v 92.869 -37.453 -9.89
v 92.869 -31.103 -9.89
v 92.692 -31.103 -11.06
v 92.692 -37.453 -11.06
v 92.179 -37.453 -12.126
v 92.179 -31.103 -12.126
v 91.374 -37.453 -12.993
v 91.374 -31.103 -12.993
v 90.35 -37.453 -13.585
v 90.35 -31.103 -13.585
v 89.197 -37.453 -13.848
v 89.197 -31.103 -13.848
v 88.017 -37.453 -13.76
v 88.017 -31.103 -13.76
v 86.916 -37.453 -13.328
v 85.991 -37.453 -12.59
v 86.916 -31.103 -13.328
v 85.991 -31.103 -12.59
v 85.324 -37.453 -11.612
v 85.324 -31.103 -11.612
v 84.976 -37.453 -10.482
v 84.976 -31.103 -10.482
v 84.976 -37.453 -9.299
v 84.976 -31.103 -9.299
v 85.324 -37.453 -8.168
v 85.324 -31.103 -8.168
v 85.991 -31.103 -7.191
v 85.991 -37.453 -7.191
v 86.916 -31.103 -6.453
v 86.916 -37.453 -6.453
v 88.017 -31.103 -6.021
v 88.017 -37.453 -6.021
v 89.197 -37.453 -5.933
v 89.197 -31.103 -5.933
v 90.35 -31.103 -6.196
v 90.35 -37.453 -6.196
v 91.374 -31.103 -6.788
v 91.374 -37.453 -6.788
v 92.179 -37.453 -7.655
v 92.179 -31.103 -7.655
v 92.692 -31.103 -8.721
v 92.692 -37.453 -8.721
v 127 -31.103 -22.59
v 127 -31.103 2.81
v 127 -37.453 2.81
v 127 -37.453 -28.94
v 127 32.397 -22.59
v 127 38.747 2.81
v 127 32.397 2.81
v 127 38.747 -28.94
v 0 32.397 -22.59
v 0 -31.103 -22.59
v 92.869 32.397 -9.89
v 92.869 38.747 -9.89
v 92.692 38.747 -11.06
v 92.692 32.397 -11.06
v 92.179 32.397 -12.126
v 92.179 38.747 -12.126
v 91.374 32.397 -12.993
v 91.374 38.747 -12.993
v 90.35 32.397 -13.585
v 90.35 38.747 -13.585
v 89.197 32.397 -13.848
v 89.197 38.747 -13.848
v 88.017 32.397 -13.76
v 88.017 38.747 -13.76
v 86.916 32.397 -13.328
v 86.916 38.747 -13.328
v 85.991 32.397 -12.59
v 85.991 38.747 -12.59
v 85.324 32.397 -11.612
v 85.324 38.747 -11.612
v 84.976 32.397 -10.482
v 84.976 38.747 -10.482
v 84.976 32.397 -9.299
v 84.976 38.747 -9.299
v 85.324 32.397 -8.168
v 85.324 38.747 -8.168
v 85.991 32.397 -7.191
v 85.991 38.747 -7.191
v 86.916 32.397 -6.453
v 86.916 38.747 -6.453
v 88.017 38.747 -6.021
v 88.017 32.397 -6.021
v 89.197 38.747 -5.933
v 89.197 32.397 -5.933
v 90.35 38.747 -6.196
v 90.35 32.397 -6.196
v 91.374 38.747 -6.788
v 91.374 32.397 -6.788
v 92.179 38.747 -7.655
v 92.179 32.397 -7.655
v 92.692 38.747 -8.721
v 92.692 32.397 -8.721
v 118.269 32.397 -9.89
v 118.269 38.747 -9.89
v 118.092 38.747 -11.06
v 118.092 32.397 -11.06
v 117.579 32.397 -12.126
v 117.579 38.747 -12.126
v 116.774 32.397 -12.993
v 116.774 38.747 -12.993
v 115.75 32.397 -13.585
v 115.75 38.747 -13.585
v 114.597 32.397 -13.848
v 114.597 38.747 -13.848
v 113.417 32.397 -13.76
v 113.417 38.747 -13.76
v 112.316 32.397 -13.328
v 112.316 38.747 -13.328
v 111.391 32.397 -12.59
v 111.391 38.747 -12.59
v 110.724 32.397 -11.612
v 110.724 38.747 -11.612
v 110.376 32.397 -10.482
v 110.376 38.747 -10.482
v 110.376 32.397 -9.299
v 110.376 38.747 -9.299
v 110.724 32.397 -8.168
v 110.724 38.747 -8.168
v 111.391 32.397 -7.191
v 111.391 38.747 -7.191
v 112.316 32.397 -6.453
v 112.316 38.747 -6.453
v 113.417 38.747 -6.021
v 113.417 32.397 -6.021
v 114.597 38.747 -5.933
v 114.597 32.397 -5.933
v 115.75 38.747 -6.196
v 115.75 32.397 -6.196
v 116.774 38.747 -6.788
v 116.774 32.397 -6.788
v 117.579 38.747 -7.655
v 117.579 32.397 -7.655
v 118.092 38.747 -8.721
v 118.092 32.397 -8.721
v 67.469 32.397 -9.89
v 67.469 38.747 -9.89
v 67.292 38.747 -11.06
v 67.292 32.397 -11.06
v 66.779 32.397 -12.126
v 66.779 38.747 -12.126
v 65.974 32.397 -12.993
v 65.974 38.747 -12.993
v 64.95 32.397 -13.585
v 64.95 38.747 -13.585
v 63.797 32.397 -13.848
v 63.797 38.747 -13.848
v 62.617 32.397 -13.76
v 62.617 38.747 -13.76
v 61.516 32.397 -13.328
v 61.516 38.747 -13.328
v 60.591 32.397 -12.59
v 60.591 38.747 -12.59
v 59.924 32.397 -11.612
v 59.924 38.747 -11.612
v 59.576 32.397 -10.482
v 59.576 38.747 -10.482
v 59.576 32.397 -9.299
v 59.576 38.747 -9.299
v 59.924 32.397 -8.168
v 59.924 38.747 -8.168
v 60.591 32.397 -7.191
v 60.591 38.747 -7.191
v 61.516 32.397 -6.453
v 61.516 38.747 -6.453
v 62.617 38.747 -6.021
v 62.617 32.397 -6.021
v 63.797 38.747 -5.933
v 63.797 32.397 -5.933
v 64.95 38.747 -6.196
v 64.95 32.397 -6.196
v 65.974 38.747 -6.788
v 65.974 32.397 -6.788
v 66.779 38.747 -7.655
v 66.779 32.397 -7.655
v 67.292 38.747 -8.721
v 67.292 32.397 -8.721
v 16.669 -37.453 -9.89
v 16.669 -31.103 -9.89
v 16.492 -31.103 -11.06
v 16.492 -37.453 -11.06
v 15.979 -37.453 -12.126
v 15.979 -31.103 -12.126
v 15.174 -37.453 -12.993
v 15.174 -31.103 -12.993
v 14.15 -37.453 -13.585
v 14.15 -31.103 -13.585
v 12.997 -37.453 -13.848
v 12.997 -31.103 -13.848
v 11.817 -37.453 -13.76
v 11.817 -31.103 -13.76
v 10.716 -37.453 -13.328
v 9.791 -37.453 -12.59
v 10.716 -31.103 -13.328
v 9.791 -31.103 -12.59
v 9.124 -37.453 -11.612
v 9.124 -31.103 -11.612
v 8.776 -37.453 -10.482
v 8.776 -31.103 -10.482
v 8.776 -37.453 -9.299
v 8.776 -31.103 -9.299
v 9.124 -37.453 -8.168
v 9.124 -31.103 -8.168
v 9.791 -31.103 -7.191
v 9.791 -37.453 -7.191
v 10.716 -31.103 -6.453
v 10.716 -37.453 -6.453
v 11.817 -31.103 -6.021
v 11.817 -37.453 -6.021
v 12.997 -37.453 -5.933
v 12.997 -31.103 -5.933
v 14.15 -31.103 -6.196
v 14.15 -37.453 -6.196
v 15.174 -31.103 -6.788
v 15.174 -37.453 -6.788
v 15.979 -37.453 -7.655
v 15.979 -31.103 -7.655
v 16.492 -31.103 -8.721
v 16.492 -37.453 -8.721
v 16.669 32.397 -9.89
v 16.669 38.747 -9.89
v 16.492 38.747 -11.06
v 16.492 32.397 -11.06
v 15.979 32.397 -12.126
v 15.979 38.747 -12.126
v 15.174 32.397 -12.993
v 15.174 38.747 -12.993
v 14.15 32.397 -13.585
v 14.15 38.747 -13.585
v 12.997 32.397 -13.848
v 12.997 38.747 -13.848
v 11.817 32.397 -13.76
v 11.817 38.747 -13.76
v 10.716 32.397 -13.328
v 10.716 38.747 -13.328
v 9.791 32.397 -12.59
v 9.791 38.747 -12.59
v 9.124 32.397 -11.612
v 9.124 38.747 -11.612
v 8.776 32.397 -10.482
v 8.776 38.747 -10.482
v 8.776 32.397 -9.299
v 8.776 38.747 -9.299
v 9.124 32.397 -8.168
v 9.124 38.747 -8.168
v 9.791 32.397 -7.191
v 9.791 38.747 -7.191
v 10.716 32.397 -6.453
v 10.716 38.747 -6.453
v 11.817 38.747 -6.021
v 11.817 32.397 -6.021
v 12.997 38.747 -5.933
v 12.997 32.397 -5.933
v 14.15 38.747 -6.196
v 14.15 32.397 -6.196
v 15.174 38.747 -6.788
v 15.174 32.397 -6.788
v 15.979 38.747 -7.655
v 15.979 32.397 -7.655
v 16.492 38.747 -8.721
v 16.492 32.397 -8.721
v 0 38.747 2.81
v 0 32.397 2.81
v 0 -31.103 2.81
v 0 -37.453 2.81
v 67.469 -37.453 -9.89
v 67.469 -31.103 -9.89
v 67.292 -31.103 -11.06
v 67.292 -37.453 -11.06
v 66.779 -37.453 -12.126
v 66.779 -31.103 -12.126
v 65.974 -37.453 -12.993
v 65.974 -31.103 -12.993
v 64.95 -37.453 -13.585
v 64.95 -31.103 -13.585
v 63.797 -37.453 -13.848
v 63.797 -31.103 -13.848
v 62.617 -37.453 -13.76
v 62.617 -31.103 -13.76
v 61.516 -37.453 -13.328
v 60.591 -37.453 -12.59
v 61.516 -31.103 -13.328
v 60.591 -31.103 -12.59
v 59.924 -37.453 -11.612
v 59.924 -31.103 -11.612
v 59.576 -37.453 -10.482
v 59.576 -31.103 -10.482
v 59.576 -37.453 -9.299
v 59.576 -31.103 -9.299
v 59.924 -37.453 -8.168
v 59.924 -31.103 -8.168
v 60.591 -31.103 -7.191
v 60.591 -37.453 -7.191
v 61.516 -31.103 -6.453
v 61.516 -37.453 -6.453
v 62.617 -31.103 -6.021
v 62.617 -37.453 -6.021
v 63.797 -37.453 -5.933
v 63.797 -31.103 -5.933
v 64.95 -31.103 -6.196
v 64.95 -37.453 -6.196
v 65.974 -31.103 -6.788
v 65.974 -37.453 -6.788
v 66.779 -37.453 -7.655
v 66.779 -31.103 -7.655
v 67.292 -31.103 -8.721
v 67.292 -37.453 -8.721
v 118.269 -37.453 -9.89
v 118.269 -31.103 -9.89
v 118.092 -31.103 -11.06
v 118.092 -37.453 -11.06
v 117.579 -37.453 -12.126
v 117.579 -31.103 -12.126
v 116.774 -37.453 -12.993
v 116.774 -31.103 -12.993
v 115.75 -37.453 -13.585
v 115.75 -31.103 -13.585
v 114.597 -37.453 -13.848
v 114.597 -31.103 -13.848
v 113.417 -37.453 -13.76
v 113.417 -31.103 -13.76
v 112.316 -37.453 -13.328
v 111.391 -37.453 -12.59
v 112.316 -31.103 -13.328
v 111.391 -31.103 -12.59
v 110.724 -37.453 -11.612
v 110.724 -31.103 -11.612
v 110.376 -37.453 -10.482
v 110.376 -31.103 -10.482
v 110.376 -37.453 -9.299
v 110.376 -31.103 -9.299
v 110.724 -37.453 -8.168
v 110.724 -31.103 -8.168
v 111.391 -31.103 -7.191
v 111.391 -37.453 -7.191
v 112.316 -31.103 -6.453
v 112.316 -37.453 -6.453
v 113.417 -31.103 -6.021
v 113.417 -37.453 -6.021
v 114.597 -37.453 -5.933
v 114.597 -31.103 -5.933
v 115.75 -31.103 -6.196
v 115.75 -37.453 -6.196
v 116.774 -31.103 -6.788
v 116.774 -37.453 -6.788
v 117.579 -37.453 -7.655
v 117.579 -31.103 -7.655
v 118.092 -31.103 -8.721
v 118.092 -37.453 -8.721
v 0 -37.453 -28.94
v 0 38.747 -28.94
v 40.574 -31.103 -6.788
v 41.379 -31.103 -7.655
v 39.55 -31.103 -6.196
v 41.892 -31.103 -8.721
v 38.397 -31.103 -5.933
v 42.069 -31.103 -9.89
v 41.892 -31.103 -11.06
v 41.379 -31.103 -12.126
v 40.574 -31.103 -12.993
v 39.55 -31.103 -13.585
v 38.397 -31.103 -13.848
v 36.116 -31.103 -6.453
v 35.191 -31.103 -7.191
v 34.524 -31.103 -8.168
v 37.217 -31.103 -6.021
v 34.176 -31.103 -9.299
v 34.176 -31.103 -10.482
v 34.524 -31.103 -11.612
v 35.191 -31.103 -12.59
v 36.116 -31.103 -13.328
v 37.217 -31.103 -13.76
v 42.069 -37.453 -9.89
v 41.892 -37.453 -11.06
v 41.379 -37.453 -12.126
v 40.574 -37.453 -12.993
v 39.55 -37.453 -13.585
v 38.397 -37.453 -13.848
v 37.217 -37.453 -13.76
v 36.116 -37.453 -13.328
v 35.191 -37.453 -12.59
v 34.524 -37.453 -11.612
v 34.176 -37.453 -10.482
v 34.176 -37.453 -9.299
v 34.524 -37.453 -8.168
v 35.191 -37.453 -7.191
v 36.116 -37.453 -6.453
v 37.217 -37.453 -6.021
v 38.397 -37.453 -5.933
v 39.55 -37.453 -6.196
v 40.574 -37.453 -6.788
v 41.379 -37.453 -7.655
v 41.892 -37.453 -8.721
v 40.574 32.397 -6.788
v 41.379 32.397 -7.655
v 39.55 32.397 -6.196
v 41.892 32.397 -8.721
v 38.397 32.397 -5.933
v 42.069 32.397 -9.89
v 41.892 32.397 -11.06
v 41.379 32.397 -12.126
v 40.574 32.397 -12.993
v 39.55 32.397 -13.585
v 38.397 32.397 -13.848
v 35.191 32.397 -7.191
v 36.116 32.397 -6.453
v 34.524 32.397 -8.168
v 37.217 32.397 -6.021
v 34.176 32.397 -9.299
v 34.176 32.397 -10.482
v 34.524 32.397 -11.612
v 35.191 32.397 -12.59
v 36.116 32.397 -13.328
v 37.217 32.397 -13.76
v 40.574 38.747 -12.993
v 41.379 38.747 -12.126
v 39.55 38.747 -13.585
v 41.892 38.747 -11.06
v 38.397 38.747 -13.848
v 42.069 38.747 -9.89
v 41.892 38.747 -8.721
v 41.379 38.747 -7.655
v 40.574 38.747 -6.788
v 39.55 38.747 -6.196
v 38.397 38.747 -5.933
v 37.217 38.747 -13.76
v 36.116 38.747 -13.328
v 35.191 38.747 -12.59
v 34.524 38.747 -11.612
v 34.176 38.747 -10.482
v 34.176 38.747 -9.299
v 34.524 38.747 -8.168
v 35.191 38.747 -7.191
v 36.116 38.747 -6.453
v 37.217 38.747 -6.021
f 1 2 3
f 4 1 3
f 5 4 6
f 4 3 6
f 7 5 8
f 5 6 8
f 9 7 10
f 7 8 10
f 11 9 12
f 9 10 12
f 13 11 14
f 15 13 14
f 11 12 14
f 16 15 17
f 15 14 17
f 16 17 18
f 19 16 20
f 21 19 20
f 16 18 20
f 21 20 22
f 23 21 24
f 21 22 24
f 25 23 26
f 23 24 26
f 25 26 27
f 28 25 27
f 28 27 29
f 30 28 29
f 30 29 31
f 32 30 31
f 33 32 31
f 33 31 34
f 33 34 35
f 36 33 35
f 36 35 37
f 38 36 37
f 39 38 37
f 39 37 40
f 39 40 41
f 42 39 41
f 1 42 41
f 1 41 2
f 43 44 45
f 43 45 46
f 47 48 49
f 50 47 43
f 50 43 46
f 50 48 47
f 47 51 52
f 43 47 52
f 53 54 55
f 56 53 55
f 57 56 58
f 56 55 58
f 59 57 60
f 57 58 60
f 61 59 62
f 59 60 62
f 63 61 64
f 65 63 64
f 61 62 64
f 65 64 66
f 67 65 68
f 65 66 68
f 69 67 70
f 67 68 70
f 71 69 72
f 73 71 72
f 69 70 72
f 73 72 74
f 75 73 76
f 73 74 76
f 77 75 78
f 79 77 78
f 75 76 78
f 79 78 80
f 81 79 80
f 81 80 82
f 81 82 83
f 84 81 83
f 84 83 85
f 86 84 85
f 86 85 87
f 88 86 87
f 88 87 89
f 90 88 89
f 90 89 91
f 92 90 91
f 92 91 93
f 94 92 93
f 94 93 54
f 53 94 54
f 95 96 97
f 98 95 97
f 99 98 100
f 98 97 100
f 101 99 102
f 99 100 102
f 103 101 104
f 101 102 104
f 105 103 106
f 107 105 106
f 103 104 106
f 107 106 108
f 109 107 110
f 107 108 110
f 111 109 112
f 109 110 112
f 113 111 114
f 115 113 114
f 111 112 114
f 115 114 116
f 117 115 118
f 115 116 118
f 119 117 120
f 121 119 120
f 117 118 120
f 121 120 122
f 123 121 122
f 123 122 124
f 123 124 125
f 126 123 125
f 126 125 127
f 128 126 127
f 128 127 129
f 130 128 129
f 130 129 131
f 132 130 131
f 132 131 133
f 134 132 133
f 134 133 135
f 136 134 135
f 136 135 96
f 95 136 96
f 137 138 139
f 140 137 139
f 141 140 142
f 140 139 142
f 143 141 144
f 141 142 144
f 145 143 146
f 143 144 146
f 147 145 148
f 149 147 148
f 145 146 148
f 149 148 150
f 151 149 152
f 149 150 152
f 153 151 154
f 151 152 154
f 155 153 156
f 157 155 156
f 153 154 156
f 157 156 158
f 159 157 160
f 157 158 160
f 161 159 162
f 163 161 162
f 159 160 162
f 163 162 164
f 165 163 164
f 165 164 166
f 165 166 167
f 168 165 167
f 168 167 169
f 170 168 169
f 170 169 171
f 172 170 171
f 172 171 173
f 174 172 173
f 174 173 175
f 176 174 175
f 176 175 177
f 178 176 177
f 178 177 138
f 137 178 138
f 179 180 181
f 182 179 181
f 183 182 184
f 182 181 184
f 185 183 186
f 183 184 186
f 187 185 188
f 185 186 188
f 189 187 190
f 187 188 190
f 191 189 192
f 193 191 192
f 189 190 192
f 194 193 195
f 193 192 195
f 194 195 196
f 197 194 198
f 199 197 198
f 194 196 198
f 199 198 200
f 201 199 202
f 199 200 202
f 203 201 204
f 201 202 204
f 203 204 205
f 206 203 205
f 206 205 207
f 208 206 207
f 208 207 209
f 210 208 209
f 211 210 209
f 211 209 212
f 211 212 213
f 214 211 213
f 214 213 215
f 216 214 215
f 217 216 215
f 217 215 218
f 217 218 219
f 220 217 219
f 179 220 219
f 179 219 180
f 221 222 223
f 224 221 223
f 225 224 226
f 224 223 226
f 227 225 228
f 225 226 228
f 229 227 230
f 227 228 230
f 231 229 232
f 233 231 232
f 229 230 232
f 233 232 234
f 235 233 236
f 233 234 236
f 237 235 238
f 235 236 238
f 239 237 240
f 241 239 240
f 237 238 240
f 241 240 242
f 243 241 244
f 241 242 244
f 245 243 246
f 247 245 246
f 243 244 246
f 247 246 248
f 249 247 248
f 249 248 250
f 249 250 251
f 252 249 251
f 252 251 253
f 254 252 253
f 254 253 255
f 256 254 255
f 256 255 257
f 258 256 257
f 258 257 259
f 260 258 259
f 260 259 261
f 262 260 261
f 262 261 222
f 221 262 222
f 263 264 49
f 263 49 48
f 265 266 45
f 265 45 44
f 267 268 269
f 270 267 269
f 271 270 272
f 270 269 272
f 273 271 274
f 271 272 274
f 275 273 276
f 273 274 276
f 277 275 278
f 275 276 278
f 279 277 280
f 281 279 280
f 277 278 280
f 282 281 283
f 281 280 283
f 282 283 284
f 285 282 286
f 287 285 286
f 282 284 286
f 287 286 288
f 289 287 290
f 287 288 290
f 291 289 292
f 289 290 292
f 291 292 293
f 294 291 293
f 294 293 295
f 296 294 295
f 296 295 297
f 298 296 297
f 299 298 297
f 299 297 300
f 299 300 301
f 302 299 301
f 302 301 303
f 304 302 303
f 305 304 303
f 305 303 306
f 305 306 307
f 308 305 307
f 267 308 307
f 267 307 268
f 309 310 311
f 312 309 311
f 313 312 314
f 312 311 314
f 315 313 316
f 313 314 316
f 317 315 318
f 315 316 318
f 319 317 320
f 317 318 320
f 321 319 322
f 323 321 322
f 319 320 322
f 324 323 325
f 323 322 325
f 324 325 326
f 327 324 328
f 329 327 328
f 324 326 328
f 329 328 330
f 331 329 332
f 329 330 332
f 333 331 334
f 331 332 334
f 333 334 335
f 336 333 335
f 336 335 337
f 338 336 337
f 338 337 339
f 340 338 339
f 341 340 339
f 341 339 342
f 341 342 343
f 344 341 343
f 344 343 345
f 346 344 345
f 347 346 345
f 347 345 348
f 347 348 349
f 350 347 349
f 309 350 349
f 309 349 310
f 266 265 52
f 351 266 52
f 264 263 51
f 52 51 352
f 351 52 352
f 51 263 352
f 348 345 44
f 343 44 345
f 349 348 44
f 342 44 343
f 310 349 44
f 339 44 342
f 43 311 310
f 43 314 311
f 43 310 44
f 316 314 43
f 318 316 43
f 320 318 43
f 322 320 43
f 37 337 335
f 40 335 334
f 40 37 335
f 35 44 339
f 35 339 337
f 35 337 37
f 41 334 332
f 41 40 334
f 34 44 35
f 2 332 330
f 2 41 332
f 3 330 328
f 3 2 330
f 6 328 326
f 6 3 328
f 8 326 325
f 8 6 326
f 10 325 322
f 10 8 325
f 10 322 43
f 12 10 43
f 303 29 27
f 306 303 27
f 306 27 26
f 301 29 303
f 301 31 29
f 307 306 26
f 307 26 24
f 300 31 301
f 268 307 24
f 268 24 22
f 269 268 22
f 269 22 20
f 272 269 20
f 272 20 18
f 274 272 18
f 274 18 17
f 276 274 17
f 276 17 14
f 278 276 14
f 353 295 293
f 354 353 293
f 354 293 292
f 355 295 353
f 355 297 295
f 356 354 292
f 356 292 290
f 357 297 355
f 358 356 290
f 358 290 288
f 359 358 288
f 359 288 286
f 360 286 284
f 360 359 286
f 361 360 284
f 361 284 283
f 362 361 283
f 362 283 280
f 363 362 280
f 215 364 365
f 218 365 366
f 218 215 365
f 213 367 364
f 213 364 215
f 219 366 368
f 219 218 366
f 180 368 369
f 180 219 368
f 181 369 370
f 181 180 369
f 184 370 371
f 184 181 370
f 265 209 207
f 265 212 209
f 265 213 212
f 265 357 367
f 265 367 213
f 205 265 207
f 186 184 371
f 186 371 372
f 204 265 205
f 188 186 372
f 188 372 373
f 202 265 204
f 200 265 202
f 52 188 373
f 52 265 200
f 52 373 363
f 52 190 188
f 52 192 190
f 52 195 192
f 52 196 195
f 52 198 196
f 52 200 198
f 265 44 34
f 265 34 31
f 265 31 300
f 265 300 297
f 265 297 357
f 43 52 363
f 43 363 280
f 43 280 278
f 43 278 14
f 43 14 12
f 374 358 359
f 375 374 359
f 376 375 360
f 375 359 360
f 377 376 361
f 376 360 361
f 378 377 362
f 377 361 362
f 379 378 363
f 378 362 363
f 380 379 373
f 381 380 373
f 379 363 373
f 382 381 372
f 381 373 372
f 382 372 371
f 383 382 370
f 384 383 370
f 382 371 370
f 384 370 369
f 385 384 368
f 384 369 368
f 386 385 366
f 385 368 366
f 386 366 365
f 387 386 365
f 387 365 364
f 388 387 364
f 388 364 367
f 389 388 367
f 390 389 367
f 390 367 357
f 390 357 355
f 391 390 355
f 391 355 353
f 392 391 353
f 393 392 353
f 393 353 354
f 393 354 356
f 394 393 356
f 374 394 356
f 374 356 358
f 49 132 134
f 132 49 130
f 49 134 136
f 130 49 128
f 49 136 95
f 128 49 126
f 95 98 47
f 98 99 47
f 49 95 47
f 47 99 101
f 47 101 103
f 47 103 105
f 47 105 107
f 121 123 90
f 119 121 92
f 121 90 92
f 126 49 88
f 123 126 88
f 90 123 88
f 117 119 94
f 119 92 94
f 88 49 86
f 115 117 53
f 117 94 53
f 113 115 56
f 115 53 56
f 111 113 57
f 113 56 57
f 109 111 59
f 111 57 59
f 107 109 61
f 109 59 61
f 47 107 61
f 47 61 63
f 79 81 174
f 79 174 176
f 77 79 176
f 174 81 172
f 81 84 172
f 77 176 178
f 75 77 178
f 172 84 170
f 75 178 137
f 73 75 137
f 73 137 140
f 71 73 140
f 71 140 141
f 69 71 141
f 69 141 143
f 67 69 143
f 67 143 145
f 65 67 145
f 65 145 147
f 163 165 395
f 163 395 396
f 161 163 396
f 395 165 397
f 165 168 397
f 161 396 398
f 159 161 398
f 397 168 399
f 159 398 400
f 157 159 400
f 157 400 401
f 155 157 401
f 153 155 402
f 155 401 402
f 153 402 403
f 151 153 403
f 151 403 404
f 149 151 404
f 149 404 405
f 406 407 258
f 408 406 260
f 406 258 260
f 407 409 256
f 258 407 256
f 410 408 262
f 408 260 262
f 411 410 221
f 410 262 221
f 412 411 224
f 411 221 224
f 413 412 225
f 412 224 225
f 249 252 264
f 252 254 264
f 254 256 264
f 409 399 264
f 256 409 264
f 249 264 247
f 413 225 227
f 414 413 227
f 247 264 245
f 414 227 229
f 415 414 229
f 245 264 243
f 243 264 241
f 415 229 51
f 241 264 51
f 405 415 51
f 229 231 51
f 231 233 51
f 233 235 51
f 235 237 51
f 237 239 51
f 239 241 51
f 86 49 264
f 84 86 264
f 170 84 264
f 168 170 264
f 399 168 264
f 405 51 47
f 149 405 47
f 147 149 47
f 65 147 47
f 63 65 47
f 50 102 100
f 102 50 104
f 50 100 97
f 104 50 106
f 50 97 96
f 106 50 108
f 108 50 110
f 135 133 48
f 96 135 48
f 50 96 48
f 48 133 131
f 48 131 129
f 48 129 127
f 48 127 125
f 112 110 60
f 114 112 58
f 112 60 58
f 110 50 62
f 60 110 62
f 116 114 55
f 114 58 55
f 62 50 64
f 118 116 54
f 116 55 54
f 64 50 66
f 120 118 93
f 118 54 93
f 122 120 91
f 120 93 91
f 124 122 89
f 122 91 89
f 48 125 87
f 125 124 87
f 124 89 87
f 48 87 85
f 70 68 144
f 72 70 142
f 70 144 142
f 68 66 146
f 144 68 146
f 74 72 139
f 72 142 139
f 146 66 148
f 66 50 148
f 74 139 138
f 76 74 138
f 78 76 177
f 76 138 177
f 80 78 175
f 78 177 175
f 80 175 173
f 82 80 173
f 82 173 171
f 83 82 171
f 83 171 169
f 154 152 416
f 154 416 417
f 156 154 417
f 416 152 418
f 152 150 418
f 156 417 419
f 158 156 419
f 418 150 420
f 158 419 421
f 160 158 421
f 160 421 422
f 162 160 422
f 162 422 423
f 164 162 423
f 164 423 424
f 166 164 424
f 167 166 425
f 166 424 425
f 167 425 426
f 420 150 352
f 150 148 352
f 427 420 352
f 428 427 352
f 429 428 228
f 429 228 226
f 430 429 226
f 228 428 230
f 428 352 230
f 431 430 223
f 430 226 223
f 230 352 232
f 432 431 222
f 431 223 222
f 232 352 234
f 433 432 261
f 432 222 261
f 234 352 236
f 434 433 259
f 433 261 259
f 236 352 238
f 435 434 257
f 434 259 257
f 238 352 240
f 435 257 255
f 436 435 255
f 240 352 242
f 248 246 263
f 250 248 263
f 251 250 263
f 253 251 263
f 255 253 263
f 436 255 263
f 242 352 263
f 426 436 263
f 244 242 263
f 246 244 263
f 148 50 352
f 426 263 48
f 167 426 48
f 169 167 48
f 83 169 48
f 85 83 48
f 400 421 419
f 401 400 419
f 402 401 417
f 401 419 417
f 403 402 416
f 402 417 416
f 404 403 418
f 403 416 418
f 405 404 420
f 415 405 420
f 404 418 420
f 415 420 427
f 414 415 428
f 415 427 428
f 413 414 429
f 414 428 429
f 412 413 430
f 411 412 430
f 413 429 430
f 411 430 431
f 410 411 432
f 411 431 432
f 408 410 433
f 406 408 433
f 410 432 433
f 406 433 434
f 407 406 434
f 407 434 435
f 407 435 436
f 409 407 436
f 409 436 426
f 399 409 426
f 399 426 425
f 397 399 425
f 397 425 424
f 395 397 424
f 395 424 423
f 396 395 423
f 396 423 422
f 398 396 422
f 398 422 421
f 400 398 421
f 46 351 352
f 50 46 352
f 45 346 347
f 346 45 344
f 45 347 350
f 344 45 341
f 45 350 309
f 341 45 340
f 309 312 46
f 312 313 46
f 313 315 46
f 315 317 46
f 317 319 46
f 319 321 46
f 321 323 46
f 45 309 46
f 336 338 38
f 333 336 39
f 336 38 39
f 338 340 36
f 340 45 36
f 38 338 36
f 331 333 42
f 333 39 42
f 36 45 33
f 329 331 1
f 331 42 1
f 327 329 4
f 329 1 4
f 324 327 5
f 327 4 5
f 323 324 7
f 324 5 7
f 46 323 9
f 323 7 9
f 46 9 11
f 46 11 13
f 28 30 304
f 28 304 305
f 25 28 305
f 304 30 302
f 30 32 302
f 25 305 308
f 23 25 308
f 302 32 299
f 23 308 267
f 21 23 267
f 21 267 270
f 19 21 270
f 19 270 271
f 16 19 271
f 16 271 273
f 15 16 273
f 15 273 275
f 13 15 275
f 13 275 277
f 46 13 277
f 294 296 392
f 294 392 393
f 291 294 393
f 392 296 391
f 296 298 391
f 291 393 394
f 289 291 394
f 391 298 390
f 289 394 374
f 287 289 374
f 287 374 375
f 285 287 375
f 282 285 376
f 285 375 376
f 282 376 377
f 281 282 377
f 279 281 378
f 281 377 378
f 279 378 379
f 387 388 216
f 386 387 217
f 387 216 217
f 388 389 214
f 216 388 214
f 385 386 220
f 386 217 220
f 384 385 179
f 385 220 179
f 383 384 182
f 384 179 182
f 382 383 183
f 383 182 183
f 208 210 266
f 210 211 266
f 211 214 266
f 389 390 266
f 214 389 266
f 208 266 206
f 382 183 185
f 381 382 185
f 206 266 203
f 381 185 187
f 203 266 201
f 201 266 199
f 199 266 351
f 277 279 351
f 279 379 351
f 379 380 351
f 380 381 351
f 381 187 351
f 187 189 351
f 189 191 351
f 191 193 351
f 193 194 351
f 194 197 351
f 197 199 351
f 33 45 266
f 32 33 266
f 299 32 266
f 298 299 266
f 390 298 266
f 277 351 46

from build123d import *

# Parameters (mm, degrees)
SKETCH1_W           = 25.4
SKETCH1_H           = 6.35
BOSS_EXTRUDE1_DEPTH = 127
SKETCH2_R           = 3.96875
CUT_EXTRUDE1_DEPTH  = 77.2


with BuildPart() as part:
    # Sketch1 → Boss-Extrude1 (new body)
    with BuildSketch(Plane(origin=(0, 0, 0), x_dir=(0, 0, -1), z_dir=(1, 0, 0))):
        with Locations((9.890468116, 35.572429457)):
            Rectangle(SKETCH1_W, SKETCH1_H)
        Polygon((28.940468116, 38.747429457), (22.590468116, 38.747429457), (22.590468116, 32.397429457), (22.590468116, -31.102570543), (22.590468116, -37.452570543), (28.940468116, -37.452570543), align=None)
        with Locations((9.890468116, -34.277570543)):
            Rectangle(SKETCH1_W, SKETCH1_H)
    extrude(amount=BOSS_EXTRUDE1_DEPTH)

    # Sketch2 → Cut-Extrude1 (cut, through all)
    with BuildSketch(Plane(origin=(0, 38.747429457, 0), x_dir=(1, 0, 0), z_dir=(0, 1, 0))):
        with Locations((114.3, 9.890468116)):
            Circle(SKETCH2_R)
        with Locations((88.9, 9.890468116)):
            Circle(SKETCH2_R)
        with Locations((63.5, 9.890468116)):
            Circle(SKETCH2_R)
        with Locations((38.1, 9.890468116)):
            Circle(SKETCH2_R)
        with Locations((12.7, 9.890468116)):
            Circle(SKETCH2_R)
    extrude(amount=-CUT_EXTRUDE1_DEPTH, mode=Mode.SUBTRACT)


solid = part.part
